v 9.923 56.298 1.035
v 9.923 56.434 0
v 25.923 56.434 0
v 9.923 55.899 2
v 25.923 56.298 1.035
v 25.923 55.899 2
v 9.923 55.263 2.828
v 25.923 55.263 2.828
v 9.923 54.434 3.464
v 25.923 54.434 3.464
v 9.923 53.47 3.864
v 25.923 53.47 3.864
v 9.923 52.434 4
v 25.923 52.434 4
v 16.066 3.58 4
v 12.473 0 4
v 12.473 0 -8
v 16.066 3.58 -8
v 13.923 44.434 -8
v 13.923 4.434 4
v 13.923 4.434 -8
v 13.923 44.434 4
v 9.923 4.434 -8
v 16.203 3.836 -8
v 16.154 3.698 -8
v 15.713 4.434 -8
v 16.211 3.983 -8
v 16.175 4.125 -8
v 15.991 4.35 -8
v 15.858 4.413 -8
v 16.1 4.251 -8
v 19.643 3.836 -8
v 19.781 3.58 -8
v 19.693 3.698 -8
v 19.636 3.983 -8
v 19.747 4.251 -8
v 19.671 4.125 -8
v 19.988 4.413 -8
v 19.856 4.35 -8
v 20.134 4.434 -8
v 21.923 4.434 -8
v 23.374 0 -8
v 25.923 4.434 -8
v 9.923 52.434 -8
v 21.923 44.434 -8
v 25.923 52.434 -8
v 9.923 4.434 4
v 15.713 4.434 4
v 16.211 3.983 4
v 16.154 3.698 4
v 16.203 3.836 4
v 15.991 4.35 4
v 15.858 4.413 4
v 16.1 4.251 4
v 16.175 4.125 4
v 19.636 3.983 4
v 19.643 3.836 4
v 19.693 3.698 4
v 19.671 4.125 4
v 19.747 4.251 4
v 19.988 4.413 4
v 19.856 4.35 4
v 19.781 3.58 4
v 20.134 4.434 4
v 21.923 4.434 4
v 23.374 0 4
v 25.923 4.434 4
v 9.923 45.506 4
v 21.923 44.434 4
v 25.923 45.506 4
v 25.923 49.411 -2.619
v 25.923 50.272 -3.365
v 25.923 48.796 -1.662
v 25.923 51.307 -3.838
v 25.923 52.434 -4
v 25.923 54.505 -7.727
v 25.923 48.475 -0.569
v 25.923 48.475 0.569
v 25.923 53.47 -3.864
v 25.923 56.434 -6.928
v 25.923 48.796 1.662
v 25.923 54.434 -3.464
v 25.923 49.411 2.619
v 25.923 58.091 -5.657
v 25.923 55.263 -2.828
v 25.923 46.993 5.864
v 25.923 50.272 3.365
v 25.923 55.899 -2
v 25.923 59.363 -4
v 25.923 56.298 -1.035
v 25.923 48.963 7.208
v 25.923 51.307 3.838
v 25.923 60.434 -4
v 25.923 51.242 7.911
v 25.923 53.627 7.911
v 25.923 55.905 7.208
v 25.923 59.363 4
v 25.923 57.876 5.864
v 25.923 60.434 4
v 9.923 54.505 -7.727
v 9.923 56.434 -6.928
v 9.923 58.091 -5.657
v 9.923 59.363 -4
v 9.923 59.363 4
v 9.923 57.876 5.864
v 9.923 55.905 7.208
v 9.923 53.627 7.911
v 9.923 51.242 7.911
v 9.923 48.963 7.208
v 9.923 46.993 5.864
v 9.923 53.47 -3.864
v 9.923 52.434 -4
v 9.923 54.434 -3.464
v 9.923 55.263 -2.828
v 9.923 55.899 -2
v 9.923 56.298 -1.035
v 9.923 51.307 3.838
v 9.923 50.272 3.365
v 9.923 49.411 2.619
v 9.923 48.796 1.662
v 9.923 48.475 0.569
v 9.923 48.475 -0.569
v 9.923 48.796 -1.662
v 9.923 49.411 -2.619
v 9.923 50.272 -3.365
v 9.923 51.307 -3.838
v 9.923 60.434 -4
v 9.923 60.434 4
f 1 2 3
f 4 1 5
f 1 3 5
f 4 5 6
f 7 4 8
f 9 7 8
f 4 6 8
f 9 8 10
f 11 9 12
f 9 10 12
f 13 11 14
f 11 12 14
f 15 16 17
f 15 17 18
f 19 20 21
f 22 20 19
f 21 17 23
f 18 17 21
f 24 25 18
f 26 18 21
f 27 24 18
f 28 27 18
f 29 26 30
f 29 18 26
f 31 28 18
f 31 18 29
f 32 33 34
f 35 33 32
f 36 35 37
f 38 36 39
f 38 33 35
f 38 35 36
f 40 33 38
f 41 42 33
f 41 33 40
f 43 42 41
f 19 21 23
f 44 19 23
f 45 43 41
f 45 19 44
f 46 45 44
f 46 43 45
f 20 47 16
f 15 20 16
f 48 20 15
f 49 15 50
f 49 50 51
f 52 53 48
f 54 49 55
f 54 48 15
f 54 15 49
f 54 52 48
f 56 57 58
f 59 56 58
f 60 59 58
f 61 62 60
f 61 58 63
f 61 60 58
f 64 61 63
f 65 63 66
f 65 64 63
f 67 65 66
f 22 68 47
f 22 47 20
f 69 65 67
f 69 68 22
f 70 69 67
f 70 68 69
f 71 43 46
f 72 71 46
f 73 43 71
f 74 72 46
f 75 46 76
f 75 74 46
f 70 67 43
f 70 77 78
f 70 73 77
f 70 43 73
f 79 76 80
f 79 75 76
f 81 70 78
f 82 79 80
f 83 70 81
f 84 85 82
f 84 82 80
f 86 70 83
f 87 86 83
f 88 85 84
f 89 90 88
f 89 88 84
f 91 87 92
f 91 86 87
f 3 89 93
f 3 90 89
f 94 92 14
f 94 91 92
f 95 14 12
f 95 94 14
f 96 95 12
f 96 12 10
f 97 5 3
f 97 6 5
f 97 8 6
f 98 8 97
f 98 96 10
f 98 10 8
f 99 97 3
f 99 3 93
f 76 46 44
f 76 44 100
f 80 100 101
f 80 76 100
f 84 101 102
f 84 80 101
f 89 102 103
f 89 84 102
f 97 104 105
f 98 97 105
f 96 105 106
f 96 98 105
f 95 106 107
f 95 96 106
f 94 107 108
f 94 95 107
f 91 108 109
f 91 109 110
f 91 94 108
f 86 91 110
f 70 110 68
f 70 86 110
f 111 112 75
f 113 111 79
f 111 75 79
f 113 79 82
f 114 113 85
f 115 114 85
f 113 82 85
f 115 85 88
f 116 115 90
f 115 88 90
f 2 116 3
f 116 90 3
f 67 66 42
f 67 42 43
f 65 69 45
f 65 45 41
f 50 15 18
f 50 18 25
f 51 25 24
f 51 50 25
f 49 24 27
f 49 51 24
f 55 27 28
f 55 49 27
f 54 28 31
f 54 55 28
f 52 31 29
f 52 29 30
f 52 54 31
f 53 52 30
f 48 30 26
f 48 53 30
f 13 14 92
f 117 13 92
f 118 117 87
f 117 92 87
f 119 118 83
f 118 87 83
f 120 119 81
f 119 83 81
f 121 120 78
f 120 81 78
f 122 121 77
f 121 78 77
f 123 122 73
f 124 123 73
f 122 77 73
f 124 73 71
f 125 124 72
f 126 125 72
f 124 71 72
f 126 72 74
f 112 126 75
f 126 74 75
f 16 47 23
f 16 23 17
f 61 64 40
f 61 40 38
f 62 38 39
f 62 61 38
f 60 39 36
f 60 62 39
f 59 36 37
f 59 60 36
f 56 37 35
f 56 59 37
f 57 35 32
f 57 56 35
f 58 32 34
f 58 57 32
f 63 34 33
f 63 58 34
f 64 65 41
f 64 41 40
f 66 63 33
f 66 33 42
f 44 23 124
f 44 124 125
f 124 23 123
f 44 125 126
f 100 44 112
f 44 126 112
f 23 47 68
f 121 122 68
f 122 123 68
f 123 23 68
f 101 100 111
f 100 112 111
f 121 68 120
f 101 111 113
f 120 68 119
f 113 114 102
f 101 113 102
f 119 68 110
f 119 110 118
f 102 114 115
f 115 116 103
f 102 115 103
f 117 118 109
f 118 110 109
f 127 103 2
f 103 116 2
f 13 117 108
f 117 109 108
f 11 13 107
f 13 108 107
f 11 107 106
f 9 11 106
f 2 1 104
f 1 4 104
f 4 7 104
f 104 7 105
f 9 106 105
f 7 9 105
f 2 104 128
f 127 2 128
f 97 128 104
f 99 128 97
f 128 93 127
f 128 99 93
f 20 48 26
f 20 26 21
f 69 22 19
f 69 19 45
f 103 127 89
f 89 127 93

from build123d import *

# Parameters (mm, degrees)
F1_DEPTH = 4
F3_DEPTH = 16
F4_DEPTH = 25
F5_DEPTH = 25


with BuildPart() as f1:
    # F0 (on Top) → F1 (new body, symmetric)
    with BuildSketch(Plane.XY):
        Polygon((9.9233569652, 60.4344099144), (9.9233569652, 44.4344099144), (13.9233569652, 44.4344099144), (21.9233569652, 44.4344099144), (25.9233569652, 44.4344099144), (25.9233569652, 60.4344099144), align=None)
        with BuildLine():
            Line((9.9233569652, 4.4344099144), (12.4728915006, 0))
            Line((12.4728915006, 0), (16.0660725096, 3.580218208))
            ThreePointArc((16.0660725096, 3.580218208), (16.1752710503, 4.1253341753), (15.7131585893, 4.4344099144))
            Line((15.7131585893, 4.4344099144), (13.9233569652, 4.4344099144))
            Line((13.9233569652, 4.4344099144), (13.9233569652, 44.4344099144))
            Line((13.9233569652, 44.4344099144), (9.9233569652, 44.4344099144))
            Line((9.9233569652, 44.4344099144), (9.9233569652, 4.4344099144))
        make_face()
        with BuildLine():
            Line((25.9233569652, 44.4344099144), (21.9233569652, 44.4344099144))
            Line((21.9233569652, 44.4344099144), (21.9233569652, 4.4344099144))
            Line((21.9233569652, 4.4344099144), (20.1335553411, 4.4344099144))
            ThreePointArc((20.1335553411, 4.4344099144), (19.6714428801, 4.1253341753), (19.7806414208, 3.580218208))
            Line((19.7806414208, 3.580218208), (23.3738224298, 0))
            Line((23.3738224298, 0), (25.9233569652, 4.4344099144))
            Line((25.9233569652, 4.4344099144), (25.9233569652, 44.4344099144))
        make_face()
    extrude(amount=F1_DEPTH, both=True)

    # F2 (on face) → F3 (join, through all)
    with BuildSketch(Plane.YZ.offset(25.9233569652)):
        with BuildLine():
            Line((59.3626131447, -4), (52.4344099144, -4))
            Line((52.4344099144, -4), (45.5062066841, -4))
            ThreePointArc((45.5062066841, -4), (48.4344099144, -6.9282032303), (52.4344099144, -8))
            ThreePointArc((52.4344099144, -8), (56.4344099144, -6.9282032303), (59.3626131447, -4))
        make_face()
        with BuildLine():
            ThreePointArc((52.4344099144, -8), (48.4344099144, -6.9282032303), (45.5062066841, -4))
            Line((45.5062066841, -4), (4.4344099144, -4))
            Line((4.4344099144, -4), (0, -4))
            Line((0, -4), (0, -8))
            Line((0, -8), (52.4344099144, -8))
        make_face()
        with BuildLine():
            Line((45.5062066841, 4), (52.4344099144, 4))
            Line((52.4344099144, 4), (59.3626131447, 4))
            ThreePointArc((59.3626131447, 4), (52.4344099144, 8), (45.5062066841, 4))
        make_face()
    extrude(amount=-F3_DEPTH)

    # F2 (on face) → F4 (cut)
    with BuildSketch(Plane.YZ.offset(25.9233569652)):
        with BuildLine():
            ThreePointArc((52.4344099144, -4), (55.2628370391, -2.8284271247), (56.4344099144, 0))
            ThreePointArc((56.4344099144, 0), (55.2628370391, 2.8284271247), (52.4344099144, 4))
            ThreePointArc((52.4344099144, 4), (48.4344099144, 0), (52.4344099144, -4))
        make_face()
    extrude(amount=-F4_DEPTH, mode=Mode.SUBTRACT)

    # F5 (cut): faces of the model
    f5_faces = [f1.faces().sort_by_distance(p)[0] for p in [
        (17.9233569652, 22.5369531537, -4),
        (10.7732018103, 1.4781366381, -4),
        (25.0735121201, 1.4781366381, -4),
    ]]
    extrude(f5_faces, amount=-F5_DEPTH, mode=Mode.SUBTRACT)


solid = f1.part
